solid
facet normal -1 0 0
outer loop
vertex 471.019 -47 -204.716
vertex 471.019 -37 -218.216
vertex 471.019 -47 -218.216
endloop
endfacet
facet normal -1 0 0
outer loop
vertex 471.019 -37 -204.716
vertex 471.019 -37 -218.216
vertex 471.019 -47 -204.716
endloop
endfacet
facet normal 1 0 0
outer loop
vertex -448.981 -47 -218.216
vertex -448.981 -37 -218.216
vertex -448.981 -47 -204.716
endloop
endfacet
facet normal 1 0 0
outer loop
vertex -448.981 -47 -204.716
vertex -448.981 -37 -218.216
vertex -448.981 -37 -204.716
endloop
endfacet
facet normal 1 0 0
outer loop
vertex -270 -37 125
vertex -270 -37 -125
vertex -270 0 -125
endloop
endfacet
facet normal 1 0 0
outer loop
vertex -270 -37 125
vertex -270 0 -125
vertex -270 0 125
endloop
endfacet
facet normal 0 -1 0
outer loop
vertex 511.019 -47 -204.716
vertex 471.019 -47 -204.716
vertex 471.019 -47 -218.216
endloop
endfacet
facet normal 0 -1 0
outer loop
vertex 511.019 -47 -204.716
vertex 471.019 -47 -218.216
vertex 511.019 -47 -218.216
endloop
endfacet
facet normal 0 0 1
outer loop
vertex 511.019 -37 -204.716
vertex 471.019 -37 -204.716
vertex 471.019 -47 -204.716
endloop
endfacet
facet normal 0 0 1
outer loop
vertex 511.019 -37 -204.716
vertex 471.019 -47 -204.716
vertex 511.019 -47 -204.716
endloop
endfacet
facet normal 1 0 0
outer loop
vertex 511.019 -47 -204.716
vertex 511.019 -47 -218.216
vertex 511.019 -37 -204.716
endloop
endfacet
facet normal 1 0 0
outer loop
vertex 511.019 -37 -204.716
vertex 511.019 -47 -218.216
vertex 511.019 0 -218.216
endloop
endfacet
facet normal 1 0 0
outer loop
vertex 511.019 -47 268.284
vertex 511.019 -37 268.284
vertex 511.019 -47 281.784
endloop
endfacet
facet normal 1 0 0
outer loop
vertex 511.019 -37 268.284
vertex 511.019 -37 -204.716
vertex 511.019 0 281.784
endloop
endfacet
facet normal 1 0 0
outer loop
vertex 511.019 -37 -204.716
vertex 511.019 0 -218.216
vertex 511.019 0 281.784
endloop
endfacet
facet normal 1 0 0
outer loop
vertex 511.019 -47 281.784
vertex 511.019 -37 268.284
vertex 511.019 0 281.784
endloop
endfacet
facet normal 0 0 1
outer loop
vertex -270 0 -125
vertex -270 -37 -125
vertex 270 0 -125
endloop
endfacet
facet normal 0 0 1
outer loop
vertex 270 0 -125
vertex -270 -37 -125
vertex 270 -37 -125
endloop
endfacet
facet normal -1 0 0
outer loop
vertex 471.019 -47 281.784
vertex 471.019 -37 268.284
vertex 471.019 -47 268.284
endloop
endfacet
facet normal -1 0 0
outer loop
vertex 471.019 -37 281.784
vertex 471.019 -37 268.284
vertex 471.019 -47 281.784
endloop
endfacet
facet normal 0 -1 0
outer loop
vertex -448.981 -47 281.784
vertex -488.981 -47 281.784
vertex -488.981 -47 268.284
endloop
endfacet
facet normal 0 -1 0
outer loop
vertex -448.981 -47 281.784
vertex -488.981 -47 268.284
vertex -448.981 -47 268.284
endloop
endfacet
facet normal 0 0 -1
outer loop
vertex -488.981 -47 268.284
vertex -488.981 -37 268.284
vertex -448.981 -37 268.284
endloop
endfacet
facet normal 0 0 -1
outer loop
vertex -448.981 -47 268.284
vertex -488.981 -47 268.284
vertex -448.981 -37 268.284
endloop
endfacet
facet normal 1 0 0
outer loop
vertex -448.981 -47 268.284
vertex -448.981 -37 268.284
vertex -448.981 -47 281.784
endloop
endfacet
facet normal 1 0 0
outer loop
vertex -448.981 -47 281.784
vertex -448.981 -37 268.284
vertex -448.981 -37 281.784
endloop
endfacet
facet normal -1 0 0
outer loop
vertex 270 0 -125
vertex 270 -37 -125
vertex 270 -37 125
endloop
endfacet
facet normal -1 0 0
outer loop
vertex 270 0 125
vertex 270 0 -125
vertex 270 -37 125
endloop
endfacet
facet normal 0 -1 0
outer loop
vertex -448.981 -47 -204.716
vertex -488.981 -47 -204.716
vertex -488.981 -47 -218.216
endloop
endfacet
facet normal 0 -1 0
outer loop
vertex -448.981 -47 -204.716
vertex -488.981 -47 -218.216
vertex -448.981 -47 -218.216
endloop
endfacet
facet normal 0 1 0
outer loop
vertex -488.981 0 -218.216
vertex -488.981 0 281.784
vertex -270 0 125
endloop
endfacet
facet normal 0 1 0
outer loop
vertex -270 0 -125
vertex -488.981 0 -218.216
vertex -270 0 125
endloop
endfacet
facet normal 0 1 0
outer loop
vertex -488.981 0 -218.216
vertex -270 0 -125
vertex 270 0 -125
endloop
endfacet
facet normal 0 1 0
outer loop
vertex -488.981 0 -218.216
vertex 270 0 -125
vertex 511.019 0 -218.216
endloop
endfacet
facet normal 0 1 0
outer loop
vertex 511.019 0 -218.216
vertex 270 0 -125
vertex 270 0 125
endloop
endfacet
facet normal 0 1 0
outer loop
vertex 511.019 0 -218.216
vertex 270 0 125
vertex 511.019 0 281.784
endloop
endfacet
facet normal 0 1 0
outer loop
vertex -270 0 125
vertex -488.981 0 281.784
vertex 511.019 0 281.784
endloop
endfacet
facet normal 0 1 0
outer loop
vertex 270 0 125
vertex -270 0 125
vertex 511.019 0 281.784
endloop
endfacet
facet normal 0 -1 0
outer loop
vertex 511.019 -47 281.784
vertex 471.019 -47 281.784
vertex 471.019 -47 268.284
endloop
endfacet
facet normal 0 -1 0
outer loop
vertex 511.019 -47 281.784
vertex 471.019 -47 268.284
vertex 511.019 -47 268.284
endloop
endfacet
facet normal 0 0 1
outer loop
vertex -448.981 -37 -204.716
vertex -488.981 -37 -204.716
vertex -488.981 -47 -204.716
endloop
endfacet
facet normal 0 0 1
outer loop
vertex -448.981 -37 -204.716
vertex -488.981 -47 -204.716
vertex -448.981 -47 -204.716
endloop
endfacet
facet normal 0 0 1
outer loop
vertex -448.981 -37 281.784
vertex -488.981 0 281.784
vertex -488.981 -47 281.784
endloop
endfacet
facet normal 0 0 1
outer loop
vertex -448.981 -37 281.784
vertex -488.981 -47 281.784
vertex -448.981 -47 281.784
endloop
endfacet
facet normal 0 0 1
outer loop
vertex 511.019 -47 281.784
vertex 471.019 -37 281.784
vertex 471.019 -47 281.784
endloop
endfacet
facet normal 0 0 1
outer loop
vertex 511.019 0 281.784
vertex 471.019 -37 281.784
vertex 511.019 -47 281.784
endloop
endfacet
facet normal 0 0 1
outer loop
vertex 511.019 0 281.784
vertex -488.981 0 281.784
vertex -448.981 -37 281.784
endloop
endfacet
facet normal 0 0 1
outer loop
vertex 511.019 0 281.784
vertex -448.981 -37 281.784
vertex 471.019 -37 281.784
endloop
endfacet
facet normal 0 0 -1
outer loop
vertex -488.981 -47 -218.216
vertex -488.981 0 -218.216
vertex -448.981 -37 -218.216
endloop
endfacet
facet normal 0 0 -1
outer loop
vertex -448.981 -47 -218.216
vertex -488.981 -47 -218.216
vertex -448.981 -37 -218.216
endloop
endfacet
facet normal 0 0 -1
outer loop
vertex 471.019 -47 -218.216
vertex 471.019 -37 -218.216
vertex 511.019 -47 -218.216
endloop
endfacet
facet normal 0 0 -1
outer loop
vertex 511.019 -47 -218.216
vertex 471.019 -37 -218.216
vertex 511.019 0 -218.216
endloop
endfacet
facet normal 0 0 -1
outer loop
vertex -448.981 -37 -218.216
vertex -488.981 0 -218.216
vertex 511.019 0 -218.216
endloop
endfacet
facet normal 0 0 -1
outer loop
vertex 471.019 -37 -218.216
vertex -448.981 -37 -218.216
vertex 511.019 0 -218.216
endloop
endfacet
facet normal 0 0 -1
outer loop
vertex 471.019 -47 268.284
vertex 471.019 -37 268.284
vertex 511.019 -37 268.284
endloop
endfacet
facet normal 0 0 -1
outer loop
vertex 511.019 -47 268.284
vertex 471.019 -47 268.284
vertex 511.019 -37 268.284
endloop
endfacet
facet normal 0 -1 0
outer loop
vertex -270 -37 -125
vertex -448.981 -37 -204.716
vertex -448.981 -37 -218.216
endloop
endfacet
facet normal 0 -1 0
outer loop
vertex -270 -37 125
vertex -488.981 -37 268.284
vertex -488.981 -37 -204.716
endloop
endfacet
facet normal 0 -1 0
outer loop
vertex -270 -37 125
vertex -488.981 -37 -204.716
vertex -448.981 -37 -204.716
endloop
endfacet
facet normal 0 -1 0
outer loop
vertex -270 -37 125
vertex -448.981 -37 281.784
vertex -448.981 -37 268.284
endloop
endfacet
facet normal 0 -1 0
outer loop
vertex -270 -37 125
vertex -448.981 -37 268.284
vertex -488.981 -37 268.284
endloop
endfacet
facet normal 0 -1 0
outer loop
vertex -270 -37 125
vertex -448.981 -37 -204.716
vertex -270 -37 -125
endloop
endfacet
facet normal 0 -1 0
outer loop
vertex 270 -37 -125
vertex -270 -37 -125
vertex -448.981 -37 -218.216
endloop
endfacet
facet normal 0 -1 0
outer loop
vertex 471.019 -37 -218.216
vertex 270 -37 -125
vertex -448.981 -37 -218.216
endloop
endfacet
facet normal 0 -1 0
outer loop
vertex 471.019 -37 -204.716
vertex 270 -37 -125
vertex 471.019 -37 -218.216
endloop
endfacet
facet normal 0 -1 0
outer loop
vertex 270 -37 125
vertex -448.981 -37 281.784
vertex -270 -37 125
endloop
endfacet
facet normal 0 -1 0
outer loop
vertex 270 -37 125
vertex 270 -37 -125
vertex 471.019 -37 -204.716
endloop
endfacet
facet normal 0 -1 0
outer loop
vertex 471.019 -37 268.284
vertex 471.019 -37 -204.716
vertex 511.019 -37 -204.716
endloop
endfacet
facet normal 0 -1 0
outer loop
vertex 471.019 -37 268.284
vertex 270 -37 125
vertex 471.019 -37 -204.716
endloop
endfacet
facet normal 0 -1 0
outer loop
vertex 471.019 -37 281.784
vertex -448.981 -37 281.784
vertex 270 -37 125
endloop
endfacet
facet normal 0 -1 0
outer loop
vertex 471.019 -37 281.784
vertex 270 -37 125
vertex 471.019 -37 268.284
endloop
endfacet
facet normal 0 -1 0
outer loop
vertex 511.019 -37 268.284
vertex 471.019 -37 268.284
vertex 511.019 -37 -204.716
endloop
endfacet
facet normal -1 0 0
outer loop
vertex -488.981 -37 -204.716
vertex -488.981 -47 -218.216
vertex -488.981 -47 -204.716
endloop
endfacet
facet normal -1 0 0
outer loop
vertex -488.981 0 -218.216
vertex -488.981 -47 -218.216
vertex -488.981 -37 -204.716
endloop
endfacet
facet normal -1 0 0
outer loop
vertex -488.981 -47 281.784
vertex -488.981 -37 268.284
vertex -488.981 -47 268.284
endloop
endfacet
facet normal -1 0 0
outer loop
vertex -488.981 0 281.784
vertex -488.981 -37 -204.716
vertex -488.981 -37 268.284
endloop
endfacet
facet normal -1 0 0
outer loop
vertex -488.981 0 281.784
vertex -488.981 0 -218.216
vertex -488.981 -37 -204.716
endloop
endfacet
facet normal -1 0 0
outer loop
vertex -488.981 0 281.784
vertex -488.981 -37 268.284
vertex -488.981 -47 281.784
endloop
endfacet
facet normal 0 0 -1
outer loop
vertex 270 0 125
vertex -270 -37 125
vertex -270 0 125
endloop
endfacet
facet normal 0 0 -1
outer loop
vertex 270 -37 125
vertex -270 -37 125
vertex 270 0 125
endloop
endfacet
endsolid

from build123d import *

# Parameters (mm, degrees)
F0_W     = 200
F0_H     = 100
F1_DEPTH = 7.4
F2_W     = 8
F2_H     = 2.7
F3_DEPTH = 2
F4_W     = 108
F4_H     = 50
F5_DEPTH = 7.401
F6_SCALE = 5


with BuildPart() as f1:
    # F0 (on Front) → F1 (new body)
    with BuildSketch(Plane.XZ):
        with Locations((2.2038258612, 6.3567497451)):
            Rectangle(F0_W, F0_H)
    extrude(amount=F1_DEPTH)

    # F2 (on face) → F3 (join)
    with BuildSketch(Plane.XZ.offset(7.4)):
        with Locations((-93.7961741388, 55.0067497451)):
            Rectangle(F2_W, F2_H)
        with Locations((98.2038258612, 55.0067497451)):
            Rectangle(F2_W, F2_H)
        with Locations((98.2038258612, -42.2932502549)):
            Rectangle(F2_W, F2_H)
        with Locations((-93.7961741388, -42.2932502549)):
            Rectangle(F2_W, F2_H)
    extrude(amount=F3_DEPTH)

    # F4 (on face) → F5 (cut, through all)
    with BuildSketch(Plane.XZ.offset(7.4)):
        Rectangle(F4_W, F4_H)
    extrude(amount=-F5_DEPTH, mode=Mode.SUBTRACT)


with BuildPart() as f1_1:
    # F6: moved
    add(f1.part.scale(F6_SCALE))


solid = f1_1.part
